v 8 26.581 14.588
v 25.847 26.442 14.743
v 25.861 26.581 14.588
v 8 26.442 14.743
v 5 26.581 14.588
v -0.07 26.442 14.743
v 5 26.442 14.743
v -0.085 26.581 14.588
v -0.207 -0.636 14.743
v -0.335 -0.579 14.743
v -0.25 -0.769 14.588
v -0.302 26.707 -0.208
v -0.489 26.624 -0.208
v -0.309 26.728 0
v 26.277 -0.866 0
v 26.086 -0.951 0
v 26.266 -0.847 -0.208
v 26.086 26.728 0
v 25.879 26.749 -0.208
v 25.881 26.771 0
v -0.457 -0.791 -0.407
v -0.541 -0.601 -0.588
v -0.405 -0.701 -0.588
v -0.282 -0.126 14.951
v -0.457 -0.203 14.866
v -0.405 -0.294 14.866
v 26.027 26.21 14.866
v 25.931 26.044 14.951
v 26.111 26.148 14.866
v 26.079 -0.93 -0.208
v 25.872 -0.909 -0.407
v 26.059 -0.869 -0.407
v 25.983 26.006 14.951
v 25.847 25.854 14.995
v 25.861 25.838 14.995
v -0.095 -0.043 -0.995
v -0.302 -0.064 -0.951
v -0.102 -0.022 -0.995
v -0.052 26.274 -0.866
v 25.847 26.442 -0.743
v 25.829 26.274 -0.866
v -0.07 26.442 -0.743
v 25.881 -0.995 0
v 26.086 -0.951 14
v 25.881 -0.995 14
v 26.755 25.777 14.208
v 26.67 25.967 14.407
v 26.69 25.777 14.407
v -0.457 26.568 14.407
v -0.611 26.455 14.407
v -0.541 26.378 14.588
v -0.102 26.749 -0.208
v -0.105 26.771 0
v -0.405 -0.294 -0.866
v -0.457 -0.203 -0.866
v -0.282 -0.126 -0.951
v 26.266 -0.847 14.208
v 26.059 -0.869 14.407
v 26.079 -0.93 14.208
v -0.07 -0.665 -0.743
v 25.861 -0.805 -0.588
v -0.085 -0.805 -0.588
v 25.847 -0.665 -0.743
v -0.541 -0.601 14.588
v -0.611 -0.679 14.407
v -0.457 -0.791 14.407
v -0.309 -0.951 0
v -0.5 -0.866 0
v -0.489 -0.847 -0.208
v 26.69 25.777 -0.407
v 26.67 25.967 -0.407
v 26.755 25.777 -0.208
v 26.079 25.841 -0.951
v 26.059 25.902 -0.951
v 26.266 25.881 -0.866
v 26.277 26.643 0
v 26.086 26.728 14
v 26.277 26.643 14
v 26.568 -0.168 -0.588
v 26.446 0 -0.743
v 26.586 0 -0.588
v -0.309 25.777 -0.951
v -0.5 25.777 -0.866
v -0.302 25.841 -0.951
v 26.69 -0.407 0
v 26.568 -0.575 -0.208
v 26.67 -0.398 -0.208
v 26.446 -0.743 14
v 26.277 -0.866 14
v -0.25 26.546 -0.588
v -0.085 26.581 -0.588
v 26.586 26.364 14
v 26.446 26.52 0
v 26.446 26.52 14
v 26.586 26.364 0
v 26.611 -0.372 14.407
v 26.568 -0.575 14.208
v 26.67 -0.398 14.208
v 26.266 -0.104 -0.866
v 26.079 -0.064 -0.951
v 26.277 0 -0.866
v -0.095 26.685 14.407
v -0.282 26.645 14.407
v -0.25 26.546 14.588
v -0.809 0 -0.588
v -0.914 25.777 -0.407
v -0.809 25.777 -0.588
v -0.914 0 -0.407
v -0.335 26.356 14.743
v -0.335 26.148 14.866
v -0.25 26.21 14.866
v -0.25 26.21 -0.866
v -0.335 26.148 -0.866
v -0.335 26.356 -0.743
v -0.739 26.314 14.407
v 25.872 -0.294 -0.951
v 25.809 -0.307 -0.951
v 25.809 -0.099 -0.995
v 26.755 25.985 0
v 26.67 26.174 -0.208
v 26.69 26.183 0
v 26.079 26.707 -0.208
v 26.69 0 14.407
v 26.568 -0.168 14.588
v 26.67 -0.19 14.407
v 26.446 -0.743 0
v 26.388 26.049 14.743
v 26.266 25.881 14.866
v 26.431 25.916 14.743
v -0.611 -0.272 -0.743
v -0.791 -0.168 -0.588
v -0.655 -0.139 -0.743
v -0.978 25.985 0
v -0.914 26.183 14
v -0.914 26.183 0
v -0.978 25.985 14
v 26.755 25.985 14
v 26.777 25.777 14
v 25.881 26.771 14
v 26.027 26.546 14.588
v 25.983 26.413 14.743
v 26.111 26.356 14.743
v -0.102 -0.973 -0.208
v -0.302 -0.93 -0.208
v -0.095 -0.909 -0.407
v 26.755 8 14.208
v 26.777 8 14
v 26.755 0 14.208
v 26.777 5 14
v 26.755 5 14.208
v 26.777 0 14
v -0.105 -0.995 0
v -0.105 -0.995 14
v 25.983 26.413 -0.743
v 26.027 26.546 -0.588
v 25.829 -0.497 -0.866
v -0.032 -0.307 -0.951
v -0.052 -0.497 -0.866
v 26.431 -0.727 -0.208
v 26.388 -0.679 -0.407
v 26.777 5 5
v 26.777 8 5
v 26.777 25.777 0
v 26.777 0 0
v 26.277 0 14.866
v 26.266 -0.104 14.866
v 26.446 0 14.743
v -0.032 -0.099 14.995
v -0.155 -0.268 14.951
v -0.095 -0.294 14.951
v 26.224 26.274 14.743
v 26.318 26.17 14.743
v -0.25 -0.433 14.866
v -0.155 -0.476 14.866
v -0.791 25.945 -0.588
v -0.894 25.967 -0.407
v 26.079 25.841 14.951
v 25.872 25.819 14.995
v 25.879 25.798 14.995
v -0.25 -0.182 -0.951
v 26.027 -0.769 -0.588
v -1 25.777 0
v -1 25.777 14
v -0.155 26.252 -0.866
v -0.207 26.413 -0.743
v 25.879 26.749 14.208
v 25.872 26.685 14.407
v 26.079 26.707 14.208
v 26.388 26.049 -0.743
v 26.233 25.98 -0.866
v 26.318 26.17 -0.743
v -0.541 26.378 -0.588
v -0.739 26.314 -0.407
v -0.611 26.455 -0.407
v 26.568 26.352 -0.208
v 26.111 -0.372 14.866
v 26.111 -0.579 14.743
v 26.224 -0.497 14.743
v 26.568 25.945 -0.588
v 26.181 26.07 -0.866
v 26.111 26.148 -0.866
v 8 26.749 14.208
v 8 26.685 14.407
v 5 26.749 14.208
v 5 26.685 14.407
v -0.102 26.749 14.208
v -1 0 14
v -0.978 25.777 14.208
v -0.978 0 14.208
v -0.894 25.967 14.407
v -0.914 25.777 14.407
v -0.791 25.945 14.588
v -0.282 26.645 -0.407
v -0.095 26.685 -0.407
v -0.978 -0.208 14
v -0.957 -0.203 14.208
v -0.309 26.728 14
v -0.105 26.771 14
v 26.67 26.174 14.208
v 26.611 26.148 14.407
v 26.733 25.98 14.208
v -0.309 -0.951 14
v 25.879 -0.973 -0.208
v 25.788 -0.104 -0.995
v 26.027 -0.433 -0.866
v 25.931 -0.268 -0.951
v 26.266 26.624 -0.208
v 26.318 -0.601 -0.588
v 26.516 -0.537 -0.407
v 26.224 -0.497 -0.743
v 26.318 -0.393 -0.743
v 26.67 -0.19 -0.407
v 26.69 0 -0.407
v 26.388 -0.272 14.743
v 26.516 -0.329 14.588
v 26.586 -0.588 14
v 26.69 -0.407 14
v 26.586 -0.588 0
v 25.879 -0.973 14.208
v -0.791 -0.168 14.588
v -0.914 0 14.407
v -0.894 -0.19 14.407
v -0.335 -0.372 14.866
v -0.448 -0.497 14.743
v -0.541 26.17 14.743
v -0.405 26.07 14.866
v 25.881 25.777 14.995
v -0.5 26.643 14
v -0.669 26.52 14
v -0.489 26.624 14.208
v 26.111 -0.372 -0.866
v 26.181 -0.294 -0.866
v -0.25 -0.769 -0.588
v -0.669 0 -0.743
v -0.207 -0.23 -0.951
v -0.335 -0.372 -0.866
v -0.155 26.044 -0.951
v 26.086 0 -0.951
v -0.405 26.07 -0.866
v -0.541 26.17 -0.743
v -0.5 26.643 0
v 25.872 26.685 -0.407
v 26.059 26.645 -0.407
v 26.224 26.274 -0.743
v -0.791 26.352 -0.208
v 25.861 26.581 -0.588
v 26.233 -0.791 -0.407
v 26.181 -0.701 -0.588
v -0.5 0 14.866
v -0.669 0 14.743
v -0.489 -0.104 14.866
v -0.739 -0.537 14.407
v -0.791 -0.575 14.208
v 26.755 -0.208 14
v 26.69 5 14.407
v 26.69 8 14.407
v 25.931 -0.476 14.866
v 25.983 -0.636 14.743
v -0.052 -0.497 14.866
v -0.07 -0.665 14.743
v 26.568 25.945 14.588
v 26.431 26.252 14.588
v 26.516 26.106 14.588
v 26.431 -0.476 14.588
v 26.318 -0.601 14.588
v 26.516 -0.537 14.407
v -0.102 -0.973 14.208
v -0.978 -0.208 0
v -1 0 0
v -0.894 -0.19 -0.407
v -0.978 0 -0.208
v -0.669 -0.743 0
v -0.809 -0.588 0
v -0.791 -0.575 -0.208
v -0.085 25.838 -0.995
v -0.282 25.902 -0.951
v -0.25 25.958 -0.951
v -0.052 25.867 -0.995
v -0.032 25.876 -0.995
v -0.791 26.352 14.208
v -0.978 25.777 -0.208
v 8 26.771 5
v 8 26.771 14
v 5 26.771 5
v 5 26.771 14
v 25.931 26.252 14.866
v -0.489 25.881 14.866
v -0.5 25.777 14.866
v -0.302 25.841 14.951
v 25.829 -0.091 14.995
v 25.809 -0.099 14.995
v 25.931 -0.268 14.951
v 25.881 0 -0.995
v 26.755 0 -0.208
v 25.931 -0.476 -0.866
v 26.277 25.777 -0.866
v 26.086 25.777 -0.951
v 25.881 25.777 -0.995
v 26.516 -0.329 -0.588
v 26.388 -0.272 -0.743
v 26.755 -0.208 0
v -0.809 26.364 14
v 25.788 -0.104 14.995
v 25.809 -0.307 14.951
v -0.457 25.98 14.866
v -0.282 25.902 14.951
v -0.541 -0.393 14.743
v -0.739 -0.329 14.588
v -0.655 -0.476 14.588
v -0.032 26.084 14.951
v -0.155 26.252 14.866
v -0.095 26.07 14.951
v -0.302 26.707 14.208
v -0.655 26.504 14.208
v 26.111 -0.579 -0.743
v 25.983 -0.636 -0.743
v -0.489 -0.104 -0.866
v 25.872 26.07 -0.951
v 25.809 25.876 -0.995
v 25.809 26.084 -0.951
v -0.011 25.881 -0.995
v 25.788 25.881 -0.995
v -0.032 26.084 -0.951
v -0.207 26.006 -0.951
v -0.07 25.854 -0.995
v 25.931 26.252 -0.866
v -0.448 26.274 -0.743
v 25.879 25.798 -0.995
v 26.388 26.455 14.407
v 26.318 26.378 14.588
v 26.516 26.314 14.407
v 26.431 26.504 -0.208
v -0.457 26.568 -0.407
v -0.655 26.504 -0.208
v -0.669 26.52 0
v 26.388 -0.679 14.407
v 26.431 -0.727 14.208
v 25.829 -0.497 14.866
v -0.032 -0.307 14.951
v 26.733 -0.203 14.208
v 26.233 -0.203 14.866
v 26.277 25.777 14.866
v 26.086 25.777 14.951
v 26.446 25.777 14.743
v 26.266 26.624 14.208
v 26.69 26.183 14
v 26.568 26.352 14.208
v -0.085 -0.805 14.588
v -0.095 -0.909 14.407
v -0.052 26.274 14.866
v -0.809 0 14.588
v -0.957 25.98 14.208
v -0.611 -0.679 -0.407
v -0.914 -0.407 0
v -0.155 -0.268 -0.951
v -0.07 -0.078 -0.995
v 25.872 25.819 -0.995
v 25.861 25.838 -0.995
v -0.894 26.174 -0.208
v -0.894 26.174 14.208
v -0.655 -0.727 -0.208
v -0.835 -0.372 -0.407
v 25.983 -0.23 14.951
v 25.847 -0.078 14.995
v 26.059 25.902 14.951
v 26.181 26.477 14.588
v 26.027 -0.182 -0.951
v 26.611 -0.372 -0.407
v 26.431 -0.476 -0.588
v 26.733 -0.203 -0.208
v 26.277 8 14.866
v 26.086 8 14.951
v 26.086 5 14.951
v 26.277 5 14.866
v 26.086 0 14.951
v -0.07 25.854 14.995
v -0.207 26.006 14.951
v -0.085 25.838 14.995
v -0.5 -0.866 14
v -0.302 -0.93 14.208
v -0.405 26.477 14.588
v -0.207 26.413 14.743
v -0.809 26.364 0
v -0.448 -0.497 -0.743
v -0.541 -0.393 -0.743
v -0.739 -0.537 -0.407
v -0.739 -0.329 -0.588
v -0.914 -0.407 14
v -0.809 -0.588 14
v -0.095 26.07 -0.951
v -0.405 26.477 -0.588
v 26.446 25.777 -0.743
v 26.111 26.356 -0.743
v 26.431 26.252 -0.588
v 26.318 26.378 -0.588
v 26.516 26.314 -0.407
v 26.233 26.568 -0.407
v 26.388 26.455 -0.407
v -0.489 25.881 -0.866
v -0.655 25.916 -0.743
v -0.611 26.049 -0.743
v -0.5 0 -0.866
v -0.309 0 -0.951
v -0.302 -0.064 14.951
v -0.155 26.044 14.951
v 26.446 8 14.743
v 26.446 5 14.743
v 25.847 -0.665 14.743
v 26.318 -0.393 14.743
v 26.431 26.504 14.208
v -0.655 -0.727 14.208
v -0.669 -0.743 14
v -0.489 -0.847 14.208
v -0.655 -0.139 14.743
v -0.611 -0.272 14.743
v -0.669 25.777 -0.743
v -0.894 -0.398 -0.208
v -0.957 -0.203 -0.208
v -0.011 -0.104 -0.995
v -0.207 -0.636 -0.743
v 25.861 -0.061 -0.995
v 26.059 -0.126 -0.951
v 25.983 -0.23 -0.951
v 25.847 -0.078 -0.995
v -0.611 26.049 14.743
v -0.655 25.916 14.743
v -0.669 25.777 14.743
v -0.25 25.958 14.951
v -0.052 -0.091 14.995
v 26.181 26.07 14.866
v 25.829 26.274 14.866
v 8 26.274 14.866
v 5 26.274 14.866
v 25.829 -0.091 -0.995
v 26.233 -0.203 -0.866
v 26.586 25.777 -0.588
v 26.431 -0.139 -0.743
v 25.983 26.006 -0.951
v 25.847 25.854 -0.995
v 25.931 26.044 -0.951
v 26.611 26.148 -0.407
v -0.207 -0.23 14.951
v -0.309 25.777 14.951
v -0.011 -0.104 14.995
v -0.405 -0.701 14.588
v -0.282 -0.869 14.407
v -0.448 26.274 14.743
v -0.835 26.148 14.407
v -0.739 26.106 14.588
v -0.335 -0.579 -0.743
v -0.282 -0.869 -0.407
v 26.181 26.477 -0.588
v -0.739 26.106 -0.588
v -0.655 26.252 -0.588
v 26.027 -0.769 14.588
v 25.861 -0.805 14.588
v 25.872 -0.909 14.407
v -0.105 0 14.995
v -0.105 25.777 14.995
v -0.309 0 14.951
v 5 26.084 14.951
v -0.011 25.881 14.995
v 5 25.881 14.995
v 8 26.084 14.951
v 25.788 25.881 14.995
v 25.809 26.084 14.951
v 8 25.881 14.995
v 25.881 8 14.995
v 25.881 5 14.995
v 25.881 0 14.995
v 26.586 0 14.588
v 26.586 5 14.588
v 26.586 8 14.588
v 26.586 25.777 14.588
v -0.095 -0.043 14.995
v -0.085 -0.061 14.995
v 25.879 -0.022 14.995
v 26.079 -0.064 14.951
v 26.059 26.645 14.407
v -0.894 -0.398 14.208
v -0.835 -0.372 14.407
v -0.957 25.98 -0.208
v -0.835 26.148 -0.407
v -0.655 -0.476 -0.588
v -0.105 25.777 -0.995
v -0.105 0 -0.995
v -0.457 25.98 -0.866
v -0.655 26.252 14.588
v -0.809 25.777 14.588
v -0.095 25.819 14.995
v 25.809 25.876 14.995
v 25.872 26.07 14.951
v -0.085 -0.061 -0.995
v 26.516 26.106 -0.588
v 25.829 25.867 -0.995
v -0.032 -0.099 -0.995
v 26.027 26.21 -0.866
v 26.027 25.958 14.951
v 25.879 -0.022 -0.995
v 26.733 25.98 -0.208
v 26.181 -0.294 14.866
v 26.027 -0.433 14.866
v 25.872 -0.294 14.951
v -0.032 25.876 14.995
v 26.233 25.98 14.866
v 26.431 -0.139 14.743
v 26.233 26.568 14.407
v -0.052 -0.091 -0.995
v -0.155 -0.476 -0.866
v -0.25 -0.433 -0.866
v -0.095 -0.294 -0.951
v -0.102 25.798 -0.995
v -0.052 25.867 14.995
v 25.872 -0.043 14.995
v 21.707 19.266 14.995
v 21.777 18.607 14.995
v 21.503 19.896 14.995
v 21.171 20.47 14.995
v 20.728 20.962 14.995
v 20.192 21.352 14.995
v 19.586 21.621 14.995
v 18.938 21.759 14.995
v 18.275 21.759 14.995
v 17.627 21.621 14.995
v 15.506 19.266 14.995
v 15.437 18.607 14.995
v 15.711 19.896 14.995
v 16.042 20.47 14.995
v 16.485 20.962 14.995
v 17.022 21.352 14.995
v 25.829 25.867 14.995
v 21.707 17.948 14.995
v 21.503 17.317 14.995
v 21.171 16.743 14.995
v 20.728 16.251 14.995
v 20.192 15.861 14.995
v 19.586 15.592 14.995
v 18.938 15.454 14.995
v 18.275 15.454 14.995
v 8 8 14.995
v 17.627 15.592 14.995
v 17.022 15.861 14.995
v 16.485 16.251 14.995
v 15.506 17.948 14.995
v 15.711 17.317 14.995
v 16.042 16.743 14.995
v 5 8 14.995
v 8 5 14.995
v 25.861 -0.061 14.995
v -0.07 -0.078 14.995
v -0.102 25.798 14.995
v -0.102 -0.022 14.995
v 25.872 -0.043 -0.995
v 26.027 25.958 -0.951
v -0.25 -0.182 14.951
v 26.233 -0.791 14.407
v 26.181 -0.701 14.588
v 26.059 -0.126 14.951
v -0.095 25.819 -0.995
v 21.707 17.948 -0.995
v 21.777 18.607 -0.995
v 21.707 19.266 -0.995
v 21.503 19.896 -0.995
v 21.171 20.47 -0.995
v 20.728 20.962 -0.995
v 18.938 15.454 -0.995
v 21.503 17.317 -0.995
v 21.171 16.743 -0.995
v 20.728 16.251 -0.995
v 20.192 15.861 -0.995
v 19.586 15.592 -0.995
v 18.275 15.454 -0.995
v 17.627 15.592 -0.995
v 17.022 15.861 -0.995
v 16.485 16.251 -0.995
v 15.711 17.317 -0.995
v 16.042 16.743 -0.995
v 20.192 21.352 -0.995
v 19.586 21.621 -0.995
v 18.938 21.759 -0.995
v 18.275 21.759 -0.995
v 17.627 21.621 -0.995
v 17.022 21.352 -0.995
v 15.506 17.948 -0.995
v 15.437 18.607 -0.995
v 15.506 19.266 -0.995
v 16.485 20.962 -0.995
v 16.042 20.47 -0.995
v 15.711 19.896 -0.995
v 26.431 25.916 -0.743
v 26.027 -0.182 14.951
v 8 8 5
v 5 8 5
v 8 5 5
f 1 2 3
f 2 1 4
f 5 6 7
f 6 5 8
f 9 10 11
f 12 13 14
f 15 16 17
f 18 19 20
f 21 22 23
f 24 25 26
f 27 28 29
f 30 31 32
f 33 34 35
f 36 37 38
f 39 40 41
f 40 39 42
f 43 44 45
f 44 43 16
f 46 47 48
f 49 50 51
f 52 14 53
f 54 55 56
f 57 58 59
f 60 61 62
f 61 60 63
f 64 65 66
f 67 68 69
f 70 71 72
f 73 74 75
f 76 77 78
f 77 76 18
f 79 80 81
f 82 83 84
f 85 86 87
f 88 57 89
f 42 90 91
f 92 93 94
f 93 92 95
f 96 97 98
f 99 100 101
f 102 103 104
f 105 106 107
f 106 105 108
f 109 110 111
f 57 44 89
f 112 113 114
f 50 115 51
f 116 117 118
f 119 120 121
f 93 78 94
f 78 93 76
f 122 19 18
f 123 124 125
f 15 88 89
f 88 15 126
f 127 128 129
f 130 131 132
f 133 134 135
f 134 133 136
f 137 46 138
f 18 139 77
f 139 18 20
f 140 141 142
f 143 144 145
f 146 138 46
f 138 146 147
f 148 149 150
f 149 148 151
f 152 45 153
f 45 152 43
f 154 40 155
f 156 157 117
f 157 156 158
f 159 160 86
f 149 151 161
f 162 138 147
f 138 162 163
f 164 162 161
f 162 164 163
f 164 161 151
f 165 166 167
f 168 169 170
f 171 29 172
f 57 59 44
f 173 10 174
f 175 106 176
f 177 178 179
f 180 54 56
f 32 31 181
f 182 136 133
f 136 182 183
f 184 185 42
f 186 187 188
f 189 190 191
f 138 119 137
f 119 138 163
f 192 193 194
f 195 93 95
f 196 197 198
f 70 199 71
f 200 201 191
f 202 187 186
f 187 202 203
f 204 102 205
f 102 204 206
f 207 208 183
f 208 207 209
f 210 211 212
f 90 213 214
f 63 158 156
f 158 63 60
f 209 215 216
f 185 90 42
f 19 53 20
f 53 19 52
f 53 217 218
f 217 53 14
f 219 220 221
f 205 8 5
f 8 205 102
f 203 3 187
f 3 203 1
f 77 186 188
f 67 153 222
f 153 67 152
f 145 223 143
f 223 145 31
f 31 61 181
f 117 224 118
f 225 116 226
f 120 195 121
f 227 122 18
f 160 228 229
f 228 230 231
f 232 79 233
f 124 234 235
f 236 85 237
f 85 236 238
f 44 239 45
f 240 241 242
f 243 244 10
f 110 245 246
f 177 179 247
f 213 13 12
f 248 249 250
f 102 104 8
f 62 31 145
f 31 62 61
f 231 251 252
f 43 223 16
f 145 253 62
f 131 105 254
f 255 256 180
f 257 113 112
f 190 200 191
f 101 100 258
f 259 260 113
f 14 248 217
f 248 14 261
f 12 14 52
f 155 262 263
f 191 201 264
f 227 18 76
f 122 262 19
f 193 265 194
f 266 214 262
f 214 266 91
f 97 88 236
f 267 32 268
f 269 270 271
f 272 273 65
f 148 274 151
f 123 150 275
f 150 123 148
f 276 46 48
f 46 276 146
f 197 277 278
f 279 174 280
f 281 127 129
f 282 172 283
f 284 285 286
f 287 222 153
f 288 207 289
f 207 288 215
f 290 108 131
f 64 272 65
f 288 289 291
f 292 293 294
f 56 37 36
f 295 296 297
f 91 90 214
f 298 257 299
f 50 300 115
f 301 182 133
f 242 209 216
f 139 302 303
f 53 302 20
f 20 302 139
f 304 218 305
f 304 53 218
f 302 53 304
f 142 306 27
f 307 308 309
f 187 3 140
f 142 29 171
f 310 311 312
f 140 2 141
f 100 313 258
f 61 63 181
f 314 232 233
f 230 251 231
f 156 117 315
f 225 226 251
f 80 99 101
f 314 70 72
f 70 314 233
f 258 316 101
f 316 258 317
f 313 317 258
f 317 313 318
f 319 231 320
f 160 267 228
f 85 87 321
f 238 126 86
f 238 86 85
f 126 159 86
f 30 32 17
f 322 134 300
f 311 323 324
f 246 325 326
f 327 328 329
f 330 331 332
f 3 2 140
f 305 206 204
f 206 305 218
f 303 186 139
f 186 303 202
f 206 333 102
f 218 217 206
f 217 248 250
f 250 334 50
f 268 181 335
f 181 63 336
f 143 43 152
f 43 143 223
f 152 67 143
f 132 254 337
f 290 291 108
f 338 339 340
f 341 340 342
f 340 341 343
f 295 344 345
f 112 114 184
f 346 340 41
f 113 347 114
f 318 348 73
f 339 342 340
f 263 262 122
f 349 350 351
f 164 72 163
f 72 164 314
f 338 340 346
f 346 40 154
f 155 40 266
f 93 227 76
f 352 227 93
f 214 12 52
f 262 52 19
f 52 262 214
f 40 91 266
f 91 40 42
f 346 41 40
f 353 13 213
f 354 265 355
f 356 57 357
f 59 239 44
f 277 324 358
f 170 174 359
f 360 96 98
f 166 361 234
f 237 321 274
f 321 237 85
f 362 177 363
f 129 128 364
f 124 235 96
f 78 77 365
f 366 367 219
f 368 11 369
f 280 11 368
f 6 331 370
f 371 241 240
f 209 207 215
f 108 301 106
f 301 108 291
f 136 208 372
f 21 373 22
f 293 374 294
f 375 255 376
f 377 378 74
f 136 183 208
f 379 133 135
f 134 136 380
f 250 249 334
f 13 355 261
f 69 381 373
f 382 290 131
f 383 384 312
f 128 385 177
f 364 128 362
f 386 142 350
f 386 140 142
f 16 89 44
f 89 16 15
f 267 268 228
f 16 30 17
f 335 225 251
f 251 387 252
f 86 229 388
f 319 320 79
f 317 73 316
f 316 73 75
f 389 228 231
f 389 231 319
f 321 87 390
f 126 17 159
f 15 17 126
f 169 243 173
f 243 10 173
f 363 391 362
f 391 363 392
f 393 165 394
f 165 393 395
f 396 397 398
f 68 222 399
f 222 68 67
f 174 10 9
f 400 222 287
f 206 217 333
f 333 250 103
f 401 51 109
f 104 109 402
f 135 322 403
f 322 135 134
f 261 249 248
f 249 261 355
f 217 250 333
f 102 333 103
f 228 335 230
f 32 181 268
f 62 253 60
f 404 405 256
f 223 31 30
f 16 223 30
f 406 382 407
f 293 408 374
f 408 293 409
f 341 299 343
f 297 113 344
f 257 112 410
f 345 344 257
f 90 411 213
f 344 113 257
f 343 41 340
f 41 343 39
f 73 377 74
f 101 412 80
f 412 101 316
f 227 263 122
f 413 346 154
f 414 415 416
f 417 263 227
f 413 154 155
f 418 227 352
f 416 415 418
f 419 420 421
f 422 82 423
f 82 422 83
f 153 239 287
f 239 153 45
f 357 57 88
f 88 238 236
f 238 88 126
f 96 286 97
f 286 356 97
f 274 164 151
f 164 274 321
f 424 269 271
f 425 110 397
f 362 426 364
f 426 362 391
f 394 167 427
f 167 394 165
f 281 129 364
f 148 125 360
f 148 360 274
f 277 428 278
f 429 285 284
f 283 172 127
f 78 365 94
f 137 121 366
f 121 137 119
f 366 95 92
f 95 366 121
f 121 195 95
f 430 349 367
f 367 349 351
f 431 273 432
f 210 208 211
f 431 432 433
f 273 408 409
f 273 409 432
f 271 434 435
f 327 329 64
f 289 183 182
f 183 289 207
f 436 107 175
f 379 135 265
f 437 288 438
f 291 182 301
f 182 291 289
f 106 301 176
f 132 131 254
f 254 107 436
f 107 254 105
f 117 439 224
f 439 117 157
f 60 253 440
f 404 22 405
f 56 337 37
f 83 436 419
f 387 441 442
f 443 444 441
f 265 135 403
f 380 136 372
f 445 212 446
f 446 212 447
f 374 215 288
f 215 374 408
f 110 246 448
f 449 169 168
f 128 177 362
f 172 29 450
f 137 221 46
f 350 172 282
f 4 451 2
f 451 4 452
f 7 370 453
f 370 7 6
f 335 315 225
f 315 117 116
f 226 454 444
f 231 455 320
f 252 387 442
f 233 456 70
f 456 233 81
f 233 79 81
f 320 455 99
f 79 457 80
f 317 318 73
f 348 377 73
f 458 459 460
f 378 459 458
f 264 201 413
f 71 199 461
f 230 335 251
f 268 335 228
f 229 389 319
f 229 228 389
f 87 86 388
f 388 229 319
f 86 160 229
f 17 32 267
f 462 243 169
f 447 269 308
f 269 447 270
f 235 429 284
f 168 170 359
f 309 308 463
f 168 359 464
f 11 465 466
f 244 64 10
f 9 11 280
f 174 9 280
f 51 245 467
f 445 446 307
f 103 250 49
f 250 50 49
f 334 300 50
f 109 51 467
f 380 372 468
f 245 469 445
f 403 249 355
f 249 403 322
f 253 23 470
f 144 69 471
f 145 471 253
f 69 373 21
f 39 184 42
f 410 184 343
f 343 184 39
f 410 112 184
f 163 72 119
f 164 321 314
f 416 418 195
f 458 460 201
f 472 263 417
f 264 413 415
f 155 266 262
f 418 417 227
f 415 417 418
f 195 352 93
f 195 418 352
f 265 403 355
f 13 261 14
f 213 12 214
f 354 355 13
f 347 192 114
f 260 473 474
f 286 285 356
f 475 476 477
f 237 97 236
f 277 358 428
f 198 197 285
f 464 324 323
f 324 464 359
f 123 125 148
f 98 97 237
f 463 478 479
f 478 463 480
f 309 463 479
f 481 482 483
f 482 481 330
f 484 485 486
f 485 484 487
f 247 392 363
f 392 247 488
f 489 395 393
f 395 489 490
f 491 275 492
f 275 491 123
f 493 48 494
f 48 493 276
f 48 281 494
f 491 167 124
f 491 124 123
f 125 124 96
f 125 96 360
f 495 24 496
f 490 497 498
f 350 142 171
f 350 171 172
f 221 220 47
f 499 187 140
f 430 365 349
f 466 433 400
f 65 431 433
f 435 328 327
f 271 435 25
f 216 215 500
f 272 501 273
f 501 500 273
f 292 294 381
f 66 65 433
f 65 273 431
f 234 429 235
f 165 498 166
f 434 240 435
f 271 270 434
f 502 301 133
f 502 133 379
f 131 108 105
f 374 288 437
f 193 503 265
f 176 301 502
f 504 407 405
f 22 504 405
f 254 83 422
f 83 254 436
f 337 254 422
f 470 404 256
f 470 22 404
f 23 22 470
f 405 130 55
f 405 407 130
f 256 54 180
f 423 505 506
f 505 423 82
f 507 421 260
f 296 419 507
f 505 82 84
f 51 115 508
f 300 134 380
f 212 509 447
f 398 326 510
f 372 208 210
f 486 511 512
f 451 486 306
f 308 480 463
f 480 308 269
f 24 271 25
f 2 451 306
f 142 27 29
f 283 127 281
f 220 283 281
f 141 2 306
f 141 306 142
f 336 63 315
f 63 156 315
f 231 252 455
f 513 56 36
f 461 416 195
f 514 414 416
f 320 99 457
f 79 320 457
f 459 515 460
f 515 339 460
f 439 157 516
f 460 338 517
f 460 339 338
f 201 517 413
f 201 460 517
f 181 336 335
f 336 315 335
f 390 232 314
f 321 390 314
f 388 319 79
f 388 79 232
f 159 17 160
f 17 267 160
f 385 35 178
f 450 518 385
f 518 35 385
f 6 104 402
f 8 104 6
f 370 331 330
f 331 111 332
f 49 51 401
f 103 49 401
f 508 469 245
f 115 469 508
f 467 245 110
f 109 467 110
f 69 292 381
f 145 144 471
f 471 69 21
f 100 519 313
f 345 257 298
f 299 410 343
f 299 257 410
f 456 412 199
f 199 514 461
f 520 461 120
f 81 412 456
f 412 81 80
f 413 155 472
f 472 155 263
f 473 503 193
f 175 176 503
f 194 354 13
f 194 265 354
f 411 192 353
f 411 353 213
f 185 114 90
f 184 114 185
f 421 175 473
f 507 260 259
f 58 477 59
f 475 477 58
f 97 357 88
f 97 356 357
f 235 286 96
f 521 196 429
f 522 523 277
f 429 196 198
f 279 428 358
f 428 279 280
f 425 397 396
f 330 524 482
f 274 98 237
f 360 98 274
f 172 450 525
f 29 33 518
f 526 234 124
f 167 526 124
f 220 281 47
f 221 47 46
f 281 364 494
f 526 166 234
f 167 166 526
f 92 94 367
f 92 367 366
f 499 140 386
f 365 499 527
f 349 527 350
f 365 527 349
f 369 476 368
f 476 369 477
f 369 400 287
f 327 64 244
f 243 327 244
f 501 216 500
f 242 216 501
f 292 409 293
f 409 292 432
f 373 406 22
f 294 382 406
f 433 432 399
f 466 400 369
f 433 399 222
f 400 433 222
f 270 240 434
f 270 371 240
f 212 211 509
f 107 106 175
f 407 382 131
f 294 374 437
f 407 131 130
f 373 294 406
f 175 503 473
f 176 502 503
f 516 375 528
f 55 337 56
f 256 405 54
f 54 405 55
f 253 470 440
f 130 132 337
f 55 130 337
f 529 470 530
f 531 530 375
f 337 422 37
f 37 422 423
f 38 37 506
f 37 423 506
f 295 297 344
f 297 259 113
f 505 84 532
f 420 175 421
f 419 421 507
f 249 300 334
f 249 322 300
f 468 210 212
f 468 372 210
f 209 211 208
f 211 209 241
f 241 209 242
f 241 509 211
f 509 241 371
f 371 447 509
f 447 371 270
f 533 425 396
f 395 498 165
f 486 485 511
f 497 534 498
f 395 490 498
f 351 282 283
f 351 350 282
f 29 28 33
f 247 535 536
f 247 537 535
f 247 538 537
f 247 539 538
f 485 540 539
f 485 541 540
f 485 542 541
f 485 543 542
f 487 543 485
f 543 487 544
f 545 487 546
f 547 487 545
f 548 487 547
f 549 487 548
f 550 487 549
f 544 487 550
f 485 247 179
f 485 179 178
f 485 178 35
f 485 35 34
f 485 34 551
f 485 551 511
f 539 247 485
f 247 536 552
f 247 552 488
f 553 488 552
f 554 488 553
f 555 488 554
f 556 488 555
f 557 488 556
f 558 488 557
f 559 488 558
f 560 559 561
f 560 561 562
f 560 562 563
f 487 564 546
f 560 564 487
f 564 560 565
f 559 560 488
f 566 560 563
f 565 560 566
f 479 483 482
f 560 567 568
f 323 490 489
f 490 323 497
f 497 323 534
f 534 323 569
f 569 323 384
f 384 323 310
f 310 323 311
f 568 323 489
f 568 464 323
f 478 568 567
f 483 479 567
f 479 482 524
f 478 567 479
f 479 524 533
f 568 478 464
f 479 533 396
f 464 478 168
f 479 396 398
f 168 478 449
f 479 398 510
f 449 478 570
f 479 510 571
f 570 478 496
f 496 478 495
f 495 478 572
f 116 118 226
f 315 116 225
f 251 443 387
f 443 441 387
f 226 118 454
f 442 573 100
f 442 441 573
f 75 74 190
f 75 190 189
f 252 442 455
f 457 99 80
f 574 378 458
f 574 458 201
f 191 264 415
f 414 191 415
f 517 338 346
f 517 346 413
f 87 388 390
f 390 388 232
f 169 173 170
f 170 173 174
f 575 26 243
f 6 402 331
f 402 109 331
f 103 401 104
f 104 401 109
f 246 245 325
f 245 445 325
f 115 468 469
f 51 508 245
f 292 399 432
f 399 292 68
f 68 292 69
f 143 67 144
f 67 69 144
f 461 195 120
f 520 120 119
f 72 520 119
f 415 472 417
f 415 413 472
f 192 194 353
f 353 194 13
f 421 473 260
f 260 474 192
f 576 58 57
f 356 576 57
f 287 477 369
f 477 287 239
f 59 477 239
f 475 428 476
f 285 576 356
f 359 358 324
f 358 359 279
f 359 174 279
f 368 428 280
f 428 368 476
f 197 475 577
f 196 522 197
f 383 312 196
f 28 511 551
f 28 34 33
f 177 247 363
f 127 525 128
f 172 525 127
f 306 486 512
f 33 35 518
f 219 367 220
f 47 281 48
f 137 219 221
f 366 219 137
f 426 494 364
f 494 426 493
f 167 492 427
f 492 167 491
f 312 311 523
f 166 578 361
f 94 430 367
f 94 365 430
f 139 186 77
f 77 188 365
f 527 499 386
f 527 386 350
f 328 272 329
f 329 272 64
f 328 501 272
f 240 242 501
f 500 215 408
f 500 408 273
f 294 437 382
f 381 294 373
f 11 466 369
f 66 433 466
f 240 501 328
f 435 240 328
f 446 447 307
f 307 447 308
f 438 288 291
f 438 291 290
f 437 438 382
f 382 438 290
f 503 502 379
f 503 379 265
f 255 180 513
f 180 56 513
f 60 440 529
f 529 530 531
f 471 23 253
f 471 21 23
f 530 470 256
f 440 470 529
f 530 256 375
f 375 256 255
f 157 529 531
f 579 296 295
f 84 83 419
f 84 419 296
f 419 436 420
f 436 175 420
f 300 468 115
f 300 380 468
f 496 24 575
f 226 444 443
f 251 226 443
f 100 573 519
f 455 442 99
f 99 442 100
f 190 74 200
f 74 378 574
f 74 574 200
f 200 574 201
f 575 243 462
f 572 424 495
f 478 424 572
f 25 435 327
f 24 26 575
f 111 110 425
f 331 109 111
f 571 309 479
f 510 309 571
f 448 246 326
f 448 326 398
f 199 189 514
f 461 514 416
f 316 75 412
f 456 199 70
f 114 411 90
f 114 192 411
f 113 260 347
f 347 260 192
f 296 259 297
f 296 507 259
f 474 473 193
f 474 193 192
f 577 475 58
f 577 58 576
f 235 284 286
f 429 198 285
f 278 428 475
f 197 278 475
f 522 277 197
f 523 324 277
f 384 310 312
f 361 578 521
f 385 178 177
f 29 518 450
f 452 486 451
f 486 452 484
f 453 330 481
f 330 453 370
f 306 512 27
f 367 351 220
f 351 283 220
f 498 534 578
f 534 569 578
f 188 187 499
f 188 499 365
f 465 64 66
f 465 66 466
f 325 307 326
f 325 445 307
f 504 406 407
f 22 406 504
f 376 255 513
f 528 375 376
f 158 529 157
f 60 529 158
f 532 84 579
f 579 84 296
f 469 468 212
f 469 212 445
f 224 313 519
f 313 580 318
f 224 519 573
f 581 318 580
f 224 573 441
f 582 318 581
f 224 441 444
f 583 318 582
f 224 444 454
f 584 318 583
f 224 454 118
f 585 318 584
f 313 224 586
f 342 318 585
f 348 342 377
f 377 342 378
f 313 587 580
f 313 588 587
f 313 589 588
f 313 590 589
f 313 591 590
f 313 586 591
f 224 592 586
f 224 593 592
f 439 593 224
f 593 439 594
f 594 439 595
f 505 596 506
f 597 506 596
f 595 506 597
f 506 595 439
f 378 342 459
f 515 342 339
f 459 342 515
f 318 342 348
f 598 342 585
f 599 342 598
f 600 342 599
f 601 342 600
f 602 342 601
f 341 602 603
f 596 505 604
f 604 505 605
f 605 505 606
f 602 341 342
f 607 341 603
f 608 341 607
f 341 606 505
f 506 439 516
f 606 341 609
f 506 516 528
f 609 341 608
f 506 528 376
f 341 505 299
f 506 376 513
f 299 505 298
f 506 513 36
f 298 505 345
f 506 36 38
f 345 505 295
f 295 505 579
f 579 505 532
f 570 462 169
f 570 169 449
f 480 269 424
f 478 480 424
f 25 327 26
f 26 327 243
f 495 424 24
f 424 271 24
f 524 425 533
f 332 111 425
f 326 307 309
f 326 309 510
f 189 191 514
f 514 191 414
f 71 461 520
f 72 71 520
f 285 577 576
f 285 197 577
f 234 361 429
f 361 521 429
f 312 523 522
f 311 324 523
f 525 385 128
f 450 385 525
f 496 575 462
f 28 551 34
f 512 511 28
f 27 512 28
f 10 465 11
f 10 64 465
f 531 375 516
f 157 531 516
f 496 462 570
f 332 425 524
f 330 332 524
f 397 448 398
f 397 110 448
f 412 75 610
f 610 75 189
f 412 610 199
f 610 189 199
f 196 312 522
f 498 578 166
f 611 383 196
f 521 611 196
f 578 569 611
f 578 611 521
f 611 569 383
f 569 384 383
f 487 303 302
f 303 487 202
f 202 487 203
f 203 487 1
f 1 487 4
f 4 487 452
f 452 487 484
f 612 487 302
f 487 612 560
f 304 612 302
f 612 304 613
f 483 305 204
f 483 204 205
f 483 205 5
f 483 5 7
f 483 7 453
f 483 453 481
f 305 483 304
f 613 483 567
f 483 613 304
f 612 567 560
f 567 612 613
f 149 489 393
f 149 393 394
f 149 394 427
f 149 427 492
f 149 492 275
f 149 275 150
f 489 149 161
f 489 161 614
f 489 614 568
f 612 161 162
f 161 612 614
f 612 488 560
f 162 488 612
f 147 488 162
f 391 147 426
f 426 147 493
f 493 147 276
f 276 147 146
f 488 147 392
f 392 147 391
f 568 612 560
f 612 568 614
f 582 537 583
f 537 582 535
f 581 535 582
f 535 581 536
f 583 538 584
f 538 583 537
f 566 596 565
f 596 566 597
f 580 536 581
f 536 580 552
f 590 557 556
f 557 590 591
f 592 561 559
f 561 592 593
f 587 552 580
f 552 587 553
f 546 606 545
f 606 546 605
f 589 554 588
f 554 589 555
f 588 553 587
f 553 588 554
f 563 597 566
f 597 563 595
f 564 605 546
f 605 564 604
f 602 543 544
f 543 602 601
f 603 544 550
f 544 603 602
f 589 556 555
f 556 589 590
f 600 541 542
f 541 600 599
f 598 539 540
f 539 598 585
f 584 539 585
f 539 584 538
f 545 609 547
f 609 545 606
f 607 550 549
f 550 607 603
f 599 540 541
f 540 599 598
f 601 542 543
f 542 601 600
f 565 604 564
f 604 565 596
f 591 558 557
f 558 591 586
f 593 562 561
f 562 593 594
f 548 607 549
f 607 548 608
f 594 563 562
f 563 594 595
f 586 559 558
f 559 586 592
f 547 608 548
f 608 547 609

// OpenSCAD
sheetThickness = 3;
boltDiameter = 6.34;
thickness = 5;
sheetOffsetFromBoltCenter = 10.60660172;
roundingRadius = 1;


boltRadius = boltDiameter/2;
cubeWidth = (thickness*2) + (boltRadius) + (sheetThickness) + (sheetOffsetFromBoltCenter)-roundingRadius;
cubeLength = cubeWidth;
cubeDepth = (thickness*3)-roundingRadius;
boltOffsetFromOrigin = sheetOffsetFromBoltCenter + thickness + sheetThickness;
$fn=30;
$vpr=[50,0,30+$t*360];

difference(){
//    translate([roundingRadius,roundingRadius,roundingRadius]){
    translate([0,0,0]){
        rotate([0,0,0]){
            minkowski(){
                cube([cubeWidth, cubeLength, cubeDepth]);
                sphere(roundingRadius);
            }
        }
    }
    translate([thickness,thickness+sheetThickness,thickness]){
        rotate([0,0,0]){
            cube([sheetThickness, cubeLength*2, cubeDepth*2]);
        }
    }
    translate([thickness+sheetThickness,thickness+sheetThickness,thickness]){
        rotate([0,0,270]){
            cube([sheetThickness, cubeLength*2, cubeDepth*2]);
        }
    }
    
    translate([boltOffsetFromOrigin,boltOffsetFromOrigin,0]){
        rotate([0,0,0]){
            cylinder(cubeDepth*3, boltRadius, boltRadius, center=true);
        }
    }
}
